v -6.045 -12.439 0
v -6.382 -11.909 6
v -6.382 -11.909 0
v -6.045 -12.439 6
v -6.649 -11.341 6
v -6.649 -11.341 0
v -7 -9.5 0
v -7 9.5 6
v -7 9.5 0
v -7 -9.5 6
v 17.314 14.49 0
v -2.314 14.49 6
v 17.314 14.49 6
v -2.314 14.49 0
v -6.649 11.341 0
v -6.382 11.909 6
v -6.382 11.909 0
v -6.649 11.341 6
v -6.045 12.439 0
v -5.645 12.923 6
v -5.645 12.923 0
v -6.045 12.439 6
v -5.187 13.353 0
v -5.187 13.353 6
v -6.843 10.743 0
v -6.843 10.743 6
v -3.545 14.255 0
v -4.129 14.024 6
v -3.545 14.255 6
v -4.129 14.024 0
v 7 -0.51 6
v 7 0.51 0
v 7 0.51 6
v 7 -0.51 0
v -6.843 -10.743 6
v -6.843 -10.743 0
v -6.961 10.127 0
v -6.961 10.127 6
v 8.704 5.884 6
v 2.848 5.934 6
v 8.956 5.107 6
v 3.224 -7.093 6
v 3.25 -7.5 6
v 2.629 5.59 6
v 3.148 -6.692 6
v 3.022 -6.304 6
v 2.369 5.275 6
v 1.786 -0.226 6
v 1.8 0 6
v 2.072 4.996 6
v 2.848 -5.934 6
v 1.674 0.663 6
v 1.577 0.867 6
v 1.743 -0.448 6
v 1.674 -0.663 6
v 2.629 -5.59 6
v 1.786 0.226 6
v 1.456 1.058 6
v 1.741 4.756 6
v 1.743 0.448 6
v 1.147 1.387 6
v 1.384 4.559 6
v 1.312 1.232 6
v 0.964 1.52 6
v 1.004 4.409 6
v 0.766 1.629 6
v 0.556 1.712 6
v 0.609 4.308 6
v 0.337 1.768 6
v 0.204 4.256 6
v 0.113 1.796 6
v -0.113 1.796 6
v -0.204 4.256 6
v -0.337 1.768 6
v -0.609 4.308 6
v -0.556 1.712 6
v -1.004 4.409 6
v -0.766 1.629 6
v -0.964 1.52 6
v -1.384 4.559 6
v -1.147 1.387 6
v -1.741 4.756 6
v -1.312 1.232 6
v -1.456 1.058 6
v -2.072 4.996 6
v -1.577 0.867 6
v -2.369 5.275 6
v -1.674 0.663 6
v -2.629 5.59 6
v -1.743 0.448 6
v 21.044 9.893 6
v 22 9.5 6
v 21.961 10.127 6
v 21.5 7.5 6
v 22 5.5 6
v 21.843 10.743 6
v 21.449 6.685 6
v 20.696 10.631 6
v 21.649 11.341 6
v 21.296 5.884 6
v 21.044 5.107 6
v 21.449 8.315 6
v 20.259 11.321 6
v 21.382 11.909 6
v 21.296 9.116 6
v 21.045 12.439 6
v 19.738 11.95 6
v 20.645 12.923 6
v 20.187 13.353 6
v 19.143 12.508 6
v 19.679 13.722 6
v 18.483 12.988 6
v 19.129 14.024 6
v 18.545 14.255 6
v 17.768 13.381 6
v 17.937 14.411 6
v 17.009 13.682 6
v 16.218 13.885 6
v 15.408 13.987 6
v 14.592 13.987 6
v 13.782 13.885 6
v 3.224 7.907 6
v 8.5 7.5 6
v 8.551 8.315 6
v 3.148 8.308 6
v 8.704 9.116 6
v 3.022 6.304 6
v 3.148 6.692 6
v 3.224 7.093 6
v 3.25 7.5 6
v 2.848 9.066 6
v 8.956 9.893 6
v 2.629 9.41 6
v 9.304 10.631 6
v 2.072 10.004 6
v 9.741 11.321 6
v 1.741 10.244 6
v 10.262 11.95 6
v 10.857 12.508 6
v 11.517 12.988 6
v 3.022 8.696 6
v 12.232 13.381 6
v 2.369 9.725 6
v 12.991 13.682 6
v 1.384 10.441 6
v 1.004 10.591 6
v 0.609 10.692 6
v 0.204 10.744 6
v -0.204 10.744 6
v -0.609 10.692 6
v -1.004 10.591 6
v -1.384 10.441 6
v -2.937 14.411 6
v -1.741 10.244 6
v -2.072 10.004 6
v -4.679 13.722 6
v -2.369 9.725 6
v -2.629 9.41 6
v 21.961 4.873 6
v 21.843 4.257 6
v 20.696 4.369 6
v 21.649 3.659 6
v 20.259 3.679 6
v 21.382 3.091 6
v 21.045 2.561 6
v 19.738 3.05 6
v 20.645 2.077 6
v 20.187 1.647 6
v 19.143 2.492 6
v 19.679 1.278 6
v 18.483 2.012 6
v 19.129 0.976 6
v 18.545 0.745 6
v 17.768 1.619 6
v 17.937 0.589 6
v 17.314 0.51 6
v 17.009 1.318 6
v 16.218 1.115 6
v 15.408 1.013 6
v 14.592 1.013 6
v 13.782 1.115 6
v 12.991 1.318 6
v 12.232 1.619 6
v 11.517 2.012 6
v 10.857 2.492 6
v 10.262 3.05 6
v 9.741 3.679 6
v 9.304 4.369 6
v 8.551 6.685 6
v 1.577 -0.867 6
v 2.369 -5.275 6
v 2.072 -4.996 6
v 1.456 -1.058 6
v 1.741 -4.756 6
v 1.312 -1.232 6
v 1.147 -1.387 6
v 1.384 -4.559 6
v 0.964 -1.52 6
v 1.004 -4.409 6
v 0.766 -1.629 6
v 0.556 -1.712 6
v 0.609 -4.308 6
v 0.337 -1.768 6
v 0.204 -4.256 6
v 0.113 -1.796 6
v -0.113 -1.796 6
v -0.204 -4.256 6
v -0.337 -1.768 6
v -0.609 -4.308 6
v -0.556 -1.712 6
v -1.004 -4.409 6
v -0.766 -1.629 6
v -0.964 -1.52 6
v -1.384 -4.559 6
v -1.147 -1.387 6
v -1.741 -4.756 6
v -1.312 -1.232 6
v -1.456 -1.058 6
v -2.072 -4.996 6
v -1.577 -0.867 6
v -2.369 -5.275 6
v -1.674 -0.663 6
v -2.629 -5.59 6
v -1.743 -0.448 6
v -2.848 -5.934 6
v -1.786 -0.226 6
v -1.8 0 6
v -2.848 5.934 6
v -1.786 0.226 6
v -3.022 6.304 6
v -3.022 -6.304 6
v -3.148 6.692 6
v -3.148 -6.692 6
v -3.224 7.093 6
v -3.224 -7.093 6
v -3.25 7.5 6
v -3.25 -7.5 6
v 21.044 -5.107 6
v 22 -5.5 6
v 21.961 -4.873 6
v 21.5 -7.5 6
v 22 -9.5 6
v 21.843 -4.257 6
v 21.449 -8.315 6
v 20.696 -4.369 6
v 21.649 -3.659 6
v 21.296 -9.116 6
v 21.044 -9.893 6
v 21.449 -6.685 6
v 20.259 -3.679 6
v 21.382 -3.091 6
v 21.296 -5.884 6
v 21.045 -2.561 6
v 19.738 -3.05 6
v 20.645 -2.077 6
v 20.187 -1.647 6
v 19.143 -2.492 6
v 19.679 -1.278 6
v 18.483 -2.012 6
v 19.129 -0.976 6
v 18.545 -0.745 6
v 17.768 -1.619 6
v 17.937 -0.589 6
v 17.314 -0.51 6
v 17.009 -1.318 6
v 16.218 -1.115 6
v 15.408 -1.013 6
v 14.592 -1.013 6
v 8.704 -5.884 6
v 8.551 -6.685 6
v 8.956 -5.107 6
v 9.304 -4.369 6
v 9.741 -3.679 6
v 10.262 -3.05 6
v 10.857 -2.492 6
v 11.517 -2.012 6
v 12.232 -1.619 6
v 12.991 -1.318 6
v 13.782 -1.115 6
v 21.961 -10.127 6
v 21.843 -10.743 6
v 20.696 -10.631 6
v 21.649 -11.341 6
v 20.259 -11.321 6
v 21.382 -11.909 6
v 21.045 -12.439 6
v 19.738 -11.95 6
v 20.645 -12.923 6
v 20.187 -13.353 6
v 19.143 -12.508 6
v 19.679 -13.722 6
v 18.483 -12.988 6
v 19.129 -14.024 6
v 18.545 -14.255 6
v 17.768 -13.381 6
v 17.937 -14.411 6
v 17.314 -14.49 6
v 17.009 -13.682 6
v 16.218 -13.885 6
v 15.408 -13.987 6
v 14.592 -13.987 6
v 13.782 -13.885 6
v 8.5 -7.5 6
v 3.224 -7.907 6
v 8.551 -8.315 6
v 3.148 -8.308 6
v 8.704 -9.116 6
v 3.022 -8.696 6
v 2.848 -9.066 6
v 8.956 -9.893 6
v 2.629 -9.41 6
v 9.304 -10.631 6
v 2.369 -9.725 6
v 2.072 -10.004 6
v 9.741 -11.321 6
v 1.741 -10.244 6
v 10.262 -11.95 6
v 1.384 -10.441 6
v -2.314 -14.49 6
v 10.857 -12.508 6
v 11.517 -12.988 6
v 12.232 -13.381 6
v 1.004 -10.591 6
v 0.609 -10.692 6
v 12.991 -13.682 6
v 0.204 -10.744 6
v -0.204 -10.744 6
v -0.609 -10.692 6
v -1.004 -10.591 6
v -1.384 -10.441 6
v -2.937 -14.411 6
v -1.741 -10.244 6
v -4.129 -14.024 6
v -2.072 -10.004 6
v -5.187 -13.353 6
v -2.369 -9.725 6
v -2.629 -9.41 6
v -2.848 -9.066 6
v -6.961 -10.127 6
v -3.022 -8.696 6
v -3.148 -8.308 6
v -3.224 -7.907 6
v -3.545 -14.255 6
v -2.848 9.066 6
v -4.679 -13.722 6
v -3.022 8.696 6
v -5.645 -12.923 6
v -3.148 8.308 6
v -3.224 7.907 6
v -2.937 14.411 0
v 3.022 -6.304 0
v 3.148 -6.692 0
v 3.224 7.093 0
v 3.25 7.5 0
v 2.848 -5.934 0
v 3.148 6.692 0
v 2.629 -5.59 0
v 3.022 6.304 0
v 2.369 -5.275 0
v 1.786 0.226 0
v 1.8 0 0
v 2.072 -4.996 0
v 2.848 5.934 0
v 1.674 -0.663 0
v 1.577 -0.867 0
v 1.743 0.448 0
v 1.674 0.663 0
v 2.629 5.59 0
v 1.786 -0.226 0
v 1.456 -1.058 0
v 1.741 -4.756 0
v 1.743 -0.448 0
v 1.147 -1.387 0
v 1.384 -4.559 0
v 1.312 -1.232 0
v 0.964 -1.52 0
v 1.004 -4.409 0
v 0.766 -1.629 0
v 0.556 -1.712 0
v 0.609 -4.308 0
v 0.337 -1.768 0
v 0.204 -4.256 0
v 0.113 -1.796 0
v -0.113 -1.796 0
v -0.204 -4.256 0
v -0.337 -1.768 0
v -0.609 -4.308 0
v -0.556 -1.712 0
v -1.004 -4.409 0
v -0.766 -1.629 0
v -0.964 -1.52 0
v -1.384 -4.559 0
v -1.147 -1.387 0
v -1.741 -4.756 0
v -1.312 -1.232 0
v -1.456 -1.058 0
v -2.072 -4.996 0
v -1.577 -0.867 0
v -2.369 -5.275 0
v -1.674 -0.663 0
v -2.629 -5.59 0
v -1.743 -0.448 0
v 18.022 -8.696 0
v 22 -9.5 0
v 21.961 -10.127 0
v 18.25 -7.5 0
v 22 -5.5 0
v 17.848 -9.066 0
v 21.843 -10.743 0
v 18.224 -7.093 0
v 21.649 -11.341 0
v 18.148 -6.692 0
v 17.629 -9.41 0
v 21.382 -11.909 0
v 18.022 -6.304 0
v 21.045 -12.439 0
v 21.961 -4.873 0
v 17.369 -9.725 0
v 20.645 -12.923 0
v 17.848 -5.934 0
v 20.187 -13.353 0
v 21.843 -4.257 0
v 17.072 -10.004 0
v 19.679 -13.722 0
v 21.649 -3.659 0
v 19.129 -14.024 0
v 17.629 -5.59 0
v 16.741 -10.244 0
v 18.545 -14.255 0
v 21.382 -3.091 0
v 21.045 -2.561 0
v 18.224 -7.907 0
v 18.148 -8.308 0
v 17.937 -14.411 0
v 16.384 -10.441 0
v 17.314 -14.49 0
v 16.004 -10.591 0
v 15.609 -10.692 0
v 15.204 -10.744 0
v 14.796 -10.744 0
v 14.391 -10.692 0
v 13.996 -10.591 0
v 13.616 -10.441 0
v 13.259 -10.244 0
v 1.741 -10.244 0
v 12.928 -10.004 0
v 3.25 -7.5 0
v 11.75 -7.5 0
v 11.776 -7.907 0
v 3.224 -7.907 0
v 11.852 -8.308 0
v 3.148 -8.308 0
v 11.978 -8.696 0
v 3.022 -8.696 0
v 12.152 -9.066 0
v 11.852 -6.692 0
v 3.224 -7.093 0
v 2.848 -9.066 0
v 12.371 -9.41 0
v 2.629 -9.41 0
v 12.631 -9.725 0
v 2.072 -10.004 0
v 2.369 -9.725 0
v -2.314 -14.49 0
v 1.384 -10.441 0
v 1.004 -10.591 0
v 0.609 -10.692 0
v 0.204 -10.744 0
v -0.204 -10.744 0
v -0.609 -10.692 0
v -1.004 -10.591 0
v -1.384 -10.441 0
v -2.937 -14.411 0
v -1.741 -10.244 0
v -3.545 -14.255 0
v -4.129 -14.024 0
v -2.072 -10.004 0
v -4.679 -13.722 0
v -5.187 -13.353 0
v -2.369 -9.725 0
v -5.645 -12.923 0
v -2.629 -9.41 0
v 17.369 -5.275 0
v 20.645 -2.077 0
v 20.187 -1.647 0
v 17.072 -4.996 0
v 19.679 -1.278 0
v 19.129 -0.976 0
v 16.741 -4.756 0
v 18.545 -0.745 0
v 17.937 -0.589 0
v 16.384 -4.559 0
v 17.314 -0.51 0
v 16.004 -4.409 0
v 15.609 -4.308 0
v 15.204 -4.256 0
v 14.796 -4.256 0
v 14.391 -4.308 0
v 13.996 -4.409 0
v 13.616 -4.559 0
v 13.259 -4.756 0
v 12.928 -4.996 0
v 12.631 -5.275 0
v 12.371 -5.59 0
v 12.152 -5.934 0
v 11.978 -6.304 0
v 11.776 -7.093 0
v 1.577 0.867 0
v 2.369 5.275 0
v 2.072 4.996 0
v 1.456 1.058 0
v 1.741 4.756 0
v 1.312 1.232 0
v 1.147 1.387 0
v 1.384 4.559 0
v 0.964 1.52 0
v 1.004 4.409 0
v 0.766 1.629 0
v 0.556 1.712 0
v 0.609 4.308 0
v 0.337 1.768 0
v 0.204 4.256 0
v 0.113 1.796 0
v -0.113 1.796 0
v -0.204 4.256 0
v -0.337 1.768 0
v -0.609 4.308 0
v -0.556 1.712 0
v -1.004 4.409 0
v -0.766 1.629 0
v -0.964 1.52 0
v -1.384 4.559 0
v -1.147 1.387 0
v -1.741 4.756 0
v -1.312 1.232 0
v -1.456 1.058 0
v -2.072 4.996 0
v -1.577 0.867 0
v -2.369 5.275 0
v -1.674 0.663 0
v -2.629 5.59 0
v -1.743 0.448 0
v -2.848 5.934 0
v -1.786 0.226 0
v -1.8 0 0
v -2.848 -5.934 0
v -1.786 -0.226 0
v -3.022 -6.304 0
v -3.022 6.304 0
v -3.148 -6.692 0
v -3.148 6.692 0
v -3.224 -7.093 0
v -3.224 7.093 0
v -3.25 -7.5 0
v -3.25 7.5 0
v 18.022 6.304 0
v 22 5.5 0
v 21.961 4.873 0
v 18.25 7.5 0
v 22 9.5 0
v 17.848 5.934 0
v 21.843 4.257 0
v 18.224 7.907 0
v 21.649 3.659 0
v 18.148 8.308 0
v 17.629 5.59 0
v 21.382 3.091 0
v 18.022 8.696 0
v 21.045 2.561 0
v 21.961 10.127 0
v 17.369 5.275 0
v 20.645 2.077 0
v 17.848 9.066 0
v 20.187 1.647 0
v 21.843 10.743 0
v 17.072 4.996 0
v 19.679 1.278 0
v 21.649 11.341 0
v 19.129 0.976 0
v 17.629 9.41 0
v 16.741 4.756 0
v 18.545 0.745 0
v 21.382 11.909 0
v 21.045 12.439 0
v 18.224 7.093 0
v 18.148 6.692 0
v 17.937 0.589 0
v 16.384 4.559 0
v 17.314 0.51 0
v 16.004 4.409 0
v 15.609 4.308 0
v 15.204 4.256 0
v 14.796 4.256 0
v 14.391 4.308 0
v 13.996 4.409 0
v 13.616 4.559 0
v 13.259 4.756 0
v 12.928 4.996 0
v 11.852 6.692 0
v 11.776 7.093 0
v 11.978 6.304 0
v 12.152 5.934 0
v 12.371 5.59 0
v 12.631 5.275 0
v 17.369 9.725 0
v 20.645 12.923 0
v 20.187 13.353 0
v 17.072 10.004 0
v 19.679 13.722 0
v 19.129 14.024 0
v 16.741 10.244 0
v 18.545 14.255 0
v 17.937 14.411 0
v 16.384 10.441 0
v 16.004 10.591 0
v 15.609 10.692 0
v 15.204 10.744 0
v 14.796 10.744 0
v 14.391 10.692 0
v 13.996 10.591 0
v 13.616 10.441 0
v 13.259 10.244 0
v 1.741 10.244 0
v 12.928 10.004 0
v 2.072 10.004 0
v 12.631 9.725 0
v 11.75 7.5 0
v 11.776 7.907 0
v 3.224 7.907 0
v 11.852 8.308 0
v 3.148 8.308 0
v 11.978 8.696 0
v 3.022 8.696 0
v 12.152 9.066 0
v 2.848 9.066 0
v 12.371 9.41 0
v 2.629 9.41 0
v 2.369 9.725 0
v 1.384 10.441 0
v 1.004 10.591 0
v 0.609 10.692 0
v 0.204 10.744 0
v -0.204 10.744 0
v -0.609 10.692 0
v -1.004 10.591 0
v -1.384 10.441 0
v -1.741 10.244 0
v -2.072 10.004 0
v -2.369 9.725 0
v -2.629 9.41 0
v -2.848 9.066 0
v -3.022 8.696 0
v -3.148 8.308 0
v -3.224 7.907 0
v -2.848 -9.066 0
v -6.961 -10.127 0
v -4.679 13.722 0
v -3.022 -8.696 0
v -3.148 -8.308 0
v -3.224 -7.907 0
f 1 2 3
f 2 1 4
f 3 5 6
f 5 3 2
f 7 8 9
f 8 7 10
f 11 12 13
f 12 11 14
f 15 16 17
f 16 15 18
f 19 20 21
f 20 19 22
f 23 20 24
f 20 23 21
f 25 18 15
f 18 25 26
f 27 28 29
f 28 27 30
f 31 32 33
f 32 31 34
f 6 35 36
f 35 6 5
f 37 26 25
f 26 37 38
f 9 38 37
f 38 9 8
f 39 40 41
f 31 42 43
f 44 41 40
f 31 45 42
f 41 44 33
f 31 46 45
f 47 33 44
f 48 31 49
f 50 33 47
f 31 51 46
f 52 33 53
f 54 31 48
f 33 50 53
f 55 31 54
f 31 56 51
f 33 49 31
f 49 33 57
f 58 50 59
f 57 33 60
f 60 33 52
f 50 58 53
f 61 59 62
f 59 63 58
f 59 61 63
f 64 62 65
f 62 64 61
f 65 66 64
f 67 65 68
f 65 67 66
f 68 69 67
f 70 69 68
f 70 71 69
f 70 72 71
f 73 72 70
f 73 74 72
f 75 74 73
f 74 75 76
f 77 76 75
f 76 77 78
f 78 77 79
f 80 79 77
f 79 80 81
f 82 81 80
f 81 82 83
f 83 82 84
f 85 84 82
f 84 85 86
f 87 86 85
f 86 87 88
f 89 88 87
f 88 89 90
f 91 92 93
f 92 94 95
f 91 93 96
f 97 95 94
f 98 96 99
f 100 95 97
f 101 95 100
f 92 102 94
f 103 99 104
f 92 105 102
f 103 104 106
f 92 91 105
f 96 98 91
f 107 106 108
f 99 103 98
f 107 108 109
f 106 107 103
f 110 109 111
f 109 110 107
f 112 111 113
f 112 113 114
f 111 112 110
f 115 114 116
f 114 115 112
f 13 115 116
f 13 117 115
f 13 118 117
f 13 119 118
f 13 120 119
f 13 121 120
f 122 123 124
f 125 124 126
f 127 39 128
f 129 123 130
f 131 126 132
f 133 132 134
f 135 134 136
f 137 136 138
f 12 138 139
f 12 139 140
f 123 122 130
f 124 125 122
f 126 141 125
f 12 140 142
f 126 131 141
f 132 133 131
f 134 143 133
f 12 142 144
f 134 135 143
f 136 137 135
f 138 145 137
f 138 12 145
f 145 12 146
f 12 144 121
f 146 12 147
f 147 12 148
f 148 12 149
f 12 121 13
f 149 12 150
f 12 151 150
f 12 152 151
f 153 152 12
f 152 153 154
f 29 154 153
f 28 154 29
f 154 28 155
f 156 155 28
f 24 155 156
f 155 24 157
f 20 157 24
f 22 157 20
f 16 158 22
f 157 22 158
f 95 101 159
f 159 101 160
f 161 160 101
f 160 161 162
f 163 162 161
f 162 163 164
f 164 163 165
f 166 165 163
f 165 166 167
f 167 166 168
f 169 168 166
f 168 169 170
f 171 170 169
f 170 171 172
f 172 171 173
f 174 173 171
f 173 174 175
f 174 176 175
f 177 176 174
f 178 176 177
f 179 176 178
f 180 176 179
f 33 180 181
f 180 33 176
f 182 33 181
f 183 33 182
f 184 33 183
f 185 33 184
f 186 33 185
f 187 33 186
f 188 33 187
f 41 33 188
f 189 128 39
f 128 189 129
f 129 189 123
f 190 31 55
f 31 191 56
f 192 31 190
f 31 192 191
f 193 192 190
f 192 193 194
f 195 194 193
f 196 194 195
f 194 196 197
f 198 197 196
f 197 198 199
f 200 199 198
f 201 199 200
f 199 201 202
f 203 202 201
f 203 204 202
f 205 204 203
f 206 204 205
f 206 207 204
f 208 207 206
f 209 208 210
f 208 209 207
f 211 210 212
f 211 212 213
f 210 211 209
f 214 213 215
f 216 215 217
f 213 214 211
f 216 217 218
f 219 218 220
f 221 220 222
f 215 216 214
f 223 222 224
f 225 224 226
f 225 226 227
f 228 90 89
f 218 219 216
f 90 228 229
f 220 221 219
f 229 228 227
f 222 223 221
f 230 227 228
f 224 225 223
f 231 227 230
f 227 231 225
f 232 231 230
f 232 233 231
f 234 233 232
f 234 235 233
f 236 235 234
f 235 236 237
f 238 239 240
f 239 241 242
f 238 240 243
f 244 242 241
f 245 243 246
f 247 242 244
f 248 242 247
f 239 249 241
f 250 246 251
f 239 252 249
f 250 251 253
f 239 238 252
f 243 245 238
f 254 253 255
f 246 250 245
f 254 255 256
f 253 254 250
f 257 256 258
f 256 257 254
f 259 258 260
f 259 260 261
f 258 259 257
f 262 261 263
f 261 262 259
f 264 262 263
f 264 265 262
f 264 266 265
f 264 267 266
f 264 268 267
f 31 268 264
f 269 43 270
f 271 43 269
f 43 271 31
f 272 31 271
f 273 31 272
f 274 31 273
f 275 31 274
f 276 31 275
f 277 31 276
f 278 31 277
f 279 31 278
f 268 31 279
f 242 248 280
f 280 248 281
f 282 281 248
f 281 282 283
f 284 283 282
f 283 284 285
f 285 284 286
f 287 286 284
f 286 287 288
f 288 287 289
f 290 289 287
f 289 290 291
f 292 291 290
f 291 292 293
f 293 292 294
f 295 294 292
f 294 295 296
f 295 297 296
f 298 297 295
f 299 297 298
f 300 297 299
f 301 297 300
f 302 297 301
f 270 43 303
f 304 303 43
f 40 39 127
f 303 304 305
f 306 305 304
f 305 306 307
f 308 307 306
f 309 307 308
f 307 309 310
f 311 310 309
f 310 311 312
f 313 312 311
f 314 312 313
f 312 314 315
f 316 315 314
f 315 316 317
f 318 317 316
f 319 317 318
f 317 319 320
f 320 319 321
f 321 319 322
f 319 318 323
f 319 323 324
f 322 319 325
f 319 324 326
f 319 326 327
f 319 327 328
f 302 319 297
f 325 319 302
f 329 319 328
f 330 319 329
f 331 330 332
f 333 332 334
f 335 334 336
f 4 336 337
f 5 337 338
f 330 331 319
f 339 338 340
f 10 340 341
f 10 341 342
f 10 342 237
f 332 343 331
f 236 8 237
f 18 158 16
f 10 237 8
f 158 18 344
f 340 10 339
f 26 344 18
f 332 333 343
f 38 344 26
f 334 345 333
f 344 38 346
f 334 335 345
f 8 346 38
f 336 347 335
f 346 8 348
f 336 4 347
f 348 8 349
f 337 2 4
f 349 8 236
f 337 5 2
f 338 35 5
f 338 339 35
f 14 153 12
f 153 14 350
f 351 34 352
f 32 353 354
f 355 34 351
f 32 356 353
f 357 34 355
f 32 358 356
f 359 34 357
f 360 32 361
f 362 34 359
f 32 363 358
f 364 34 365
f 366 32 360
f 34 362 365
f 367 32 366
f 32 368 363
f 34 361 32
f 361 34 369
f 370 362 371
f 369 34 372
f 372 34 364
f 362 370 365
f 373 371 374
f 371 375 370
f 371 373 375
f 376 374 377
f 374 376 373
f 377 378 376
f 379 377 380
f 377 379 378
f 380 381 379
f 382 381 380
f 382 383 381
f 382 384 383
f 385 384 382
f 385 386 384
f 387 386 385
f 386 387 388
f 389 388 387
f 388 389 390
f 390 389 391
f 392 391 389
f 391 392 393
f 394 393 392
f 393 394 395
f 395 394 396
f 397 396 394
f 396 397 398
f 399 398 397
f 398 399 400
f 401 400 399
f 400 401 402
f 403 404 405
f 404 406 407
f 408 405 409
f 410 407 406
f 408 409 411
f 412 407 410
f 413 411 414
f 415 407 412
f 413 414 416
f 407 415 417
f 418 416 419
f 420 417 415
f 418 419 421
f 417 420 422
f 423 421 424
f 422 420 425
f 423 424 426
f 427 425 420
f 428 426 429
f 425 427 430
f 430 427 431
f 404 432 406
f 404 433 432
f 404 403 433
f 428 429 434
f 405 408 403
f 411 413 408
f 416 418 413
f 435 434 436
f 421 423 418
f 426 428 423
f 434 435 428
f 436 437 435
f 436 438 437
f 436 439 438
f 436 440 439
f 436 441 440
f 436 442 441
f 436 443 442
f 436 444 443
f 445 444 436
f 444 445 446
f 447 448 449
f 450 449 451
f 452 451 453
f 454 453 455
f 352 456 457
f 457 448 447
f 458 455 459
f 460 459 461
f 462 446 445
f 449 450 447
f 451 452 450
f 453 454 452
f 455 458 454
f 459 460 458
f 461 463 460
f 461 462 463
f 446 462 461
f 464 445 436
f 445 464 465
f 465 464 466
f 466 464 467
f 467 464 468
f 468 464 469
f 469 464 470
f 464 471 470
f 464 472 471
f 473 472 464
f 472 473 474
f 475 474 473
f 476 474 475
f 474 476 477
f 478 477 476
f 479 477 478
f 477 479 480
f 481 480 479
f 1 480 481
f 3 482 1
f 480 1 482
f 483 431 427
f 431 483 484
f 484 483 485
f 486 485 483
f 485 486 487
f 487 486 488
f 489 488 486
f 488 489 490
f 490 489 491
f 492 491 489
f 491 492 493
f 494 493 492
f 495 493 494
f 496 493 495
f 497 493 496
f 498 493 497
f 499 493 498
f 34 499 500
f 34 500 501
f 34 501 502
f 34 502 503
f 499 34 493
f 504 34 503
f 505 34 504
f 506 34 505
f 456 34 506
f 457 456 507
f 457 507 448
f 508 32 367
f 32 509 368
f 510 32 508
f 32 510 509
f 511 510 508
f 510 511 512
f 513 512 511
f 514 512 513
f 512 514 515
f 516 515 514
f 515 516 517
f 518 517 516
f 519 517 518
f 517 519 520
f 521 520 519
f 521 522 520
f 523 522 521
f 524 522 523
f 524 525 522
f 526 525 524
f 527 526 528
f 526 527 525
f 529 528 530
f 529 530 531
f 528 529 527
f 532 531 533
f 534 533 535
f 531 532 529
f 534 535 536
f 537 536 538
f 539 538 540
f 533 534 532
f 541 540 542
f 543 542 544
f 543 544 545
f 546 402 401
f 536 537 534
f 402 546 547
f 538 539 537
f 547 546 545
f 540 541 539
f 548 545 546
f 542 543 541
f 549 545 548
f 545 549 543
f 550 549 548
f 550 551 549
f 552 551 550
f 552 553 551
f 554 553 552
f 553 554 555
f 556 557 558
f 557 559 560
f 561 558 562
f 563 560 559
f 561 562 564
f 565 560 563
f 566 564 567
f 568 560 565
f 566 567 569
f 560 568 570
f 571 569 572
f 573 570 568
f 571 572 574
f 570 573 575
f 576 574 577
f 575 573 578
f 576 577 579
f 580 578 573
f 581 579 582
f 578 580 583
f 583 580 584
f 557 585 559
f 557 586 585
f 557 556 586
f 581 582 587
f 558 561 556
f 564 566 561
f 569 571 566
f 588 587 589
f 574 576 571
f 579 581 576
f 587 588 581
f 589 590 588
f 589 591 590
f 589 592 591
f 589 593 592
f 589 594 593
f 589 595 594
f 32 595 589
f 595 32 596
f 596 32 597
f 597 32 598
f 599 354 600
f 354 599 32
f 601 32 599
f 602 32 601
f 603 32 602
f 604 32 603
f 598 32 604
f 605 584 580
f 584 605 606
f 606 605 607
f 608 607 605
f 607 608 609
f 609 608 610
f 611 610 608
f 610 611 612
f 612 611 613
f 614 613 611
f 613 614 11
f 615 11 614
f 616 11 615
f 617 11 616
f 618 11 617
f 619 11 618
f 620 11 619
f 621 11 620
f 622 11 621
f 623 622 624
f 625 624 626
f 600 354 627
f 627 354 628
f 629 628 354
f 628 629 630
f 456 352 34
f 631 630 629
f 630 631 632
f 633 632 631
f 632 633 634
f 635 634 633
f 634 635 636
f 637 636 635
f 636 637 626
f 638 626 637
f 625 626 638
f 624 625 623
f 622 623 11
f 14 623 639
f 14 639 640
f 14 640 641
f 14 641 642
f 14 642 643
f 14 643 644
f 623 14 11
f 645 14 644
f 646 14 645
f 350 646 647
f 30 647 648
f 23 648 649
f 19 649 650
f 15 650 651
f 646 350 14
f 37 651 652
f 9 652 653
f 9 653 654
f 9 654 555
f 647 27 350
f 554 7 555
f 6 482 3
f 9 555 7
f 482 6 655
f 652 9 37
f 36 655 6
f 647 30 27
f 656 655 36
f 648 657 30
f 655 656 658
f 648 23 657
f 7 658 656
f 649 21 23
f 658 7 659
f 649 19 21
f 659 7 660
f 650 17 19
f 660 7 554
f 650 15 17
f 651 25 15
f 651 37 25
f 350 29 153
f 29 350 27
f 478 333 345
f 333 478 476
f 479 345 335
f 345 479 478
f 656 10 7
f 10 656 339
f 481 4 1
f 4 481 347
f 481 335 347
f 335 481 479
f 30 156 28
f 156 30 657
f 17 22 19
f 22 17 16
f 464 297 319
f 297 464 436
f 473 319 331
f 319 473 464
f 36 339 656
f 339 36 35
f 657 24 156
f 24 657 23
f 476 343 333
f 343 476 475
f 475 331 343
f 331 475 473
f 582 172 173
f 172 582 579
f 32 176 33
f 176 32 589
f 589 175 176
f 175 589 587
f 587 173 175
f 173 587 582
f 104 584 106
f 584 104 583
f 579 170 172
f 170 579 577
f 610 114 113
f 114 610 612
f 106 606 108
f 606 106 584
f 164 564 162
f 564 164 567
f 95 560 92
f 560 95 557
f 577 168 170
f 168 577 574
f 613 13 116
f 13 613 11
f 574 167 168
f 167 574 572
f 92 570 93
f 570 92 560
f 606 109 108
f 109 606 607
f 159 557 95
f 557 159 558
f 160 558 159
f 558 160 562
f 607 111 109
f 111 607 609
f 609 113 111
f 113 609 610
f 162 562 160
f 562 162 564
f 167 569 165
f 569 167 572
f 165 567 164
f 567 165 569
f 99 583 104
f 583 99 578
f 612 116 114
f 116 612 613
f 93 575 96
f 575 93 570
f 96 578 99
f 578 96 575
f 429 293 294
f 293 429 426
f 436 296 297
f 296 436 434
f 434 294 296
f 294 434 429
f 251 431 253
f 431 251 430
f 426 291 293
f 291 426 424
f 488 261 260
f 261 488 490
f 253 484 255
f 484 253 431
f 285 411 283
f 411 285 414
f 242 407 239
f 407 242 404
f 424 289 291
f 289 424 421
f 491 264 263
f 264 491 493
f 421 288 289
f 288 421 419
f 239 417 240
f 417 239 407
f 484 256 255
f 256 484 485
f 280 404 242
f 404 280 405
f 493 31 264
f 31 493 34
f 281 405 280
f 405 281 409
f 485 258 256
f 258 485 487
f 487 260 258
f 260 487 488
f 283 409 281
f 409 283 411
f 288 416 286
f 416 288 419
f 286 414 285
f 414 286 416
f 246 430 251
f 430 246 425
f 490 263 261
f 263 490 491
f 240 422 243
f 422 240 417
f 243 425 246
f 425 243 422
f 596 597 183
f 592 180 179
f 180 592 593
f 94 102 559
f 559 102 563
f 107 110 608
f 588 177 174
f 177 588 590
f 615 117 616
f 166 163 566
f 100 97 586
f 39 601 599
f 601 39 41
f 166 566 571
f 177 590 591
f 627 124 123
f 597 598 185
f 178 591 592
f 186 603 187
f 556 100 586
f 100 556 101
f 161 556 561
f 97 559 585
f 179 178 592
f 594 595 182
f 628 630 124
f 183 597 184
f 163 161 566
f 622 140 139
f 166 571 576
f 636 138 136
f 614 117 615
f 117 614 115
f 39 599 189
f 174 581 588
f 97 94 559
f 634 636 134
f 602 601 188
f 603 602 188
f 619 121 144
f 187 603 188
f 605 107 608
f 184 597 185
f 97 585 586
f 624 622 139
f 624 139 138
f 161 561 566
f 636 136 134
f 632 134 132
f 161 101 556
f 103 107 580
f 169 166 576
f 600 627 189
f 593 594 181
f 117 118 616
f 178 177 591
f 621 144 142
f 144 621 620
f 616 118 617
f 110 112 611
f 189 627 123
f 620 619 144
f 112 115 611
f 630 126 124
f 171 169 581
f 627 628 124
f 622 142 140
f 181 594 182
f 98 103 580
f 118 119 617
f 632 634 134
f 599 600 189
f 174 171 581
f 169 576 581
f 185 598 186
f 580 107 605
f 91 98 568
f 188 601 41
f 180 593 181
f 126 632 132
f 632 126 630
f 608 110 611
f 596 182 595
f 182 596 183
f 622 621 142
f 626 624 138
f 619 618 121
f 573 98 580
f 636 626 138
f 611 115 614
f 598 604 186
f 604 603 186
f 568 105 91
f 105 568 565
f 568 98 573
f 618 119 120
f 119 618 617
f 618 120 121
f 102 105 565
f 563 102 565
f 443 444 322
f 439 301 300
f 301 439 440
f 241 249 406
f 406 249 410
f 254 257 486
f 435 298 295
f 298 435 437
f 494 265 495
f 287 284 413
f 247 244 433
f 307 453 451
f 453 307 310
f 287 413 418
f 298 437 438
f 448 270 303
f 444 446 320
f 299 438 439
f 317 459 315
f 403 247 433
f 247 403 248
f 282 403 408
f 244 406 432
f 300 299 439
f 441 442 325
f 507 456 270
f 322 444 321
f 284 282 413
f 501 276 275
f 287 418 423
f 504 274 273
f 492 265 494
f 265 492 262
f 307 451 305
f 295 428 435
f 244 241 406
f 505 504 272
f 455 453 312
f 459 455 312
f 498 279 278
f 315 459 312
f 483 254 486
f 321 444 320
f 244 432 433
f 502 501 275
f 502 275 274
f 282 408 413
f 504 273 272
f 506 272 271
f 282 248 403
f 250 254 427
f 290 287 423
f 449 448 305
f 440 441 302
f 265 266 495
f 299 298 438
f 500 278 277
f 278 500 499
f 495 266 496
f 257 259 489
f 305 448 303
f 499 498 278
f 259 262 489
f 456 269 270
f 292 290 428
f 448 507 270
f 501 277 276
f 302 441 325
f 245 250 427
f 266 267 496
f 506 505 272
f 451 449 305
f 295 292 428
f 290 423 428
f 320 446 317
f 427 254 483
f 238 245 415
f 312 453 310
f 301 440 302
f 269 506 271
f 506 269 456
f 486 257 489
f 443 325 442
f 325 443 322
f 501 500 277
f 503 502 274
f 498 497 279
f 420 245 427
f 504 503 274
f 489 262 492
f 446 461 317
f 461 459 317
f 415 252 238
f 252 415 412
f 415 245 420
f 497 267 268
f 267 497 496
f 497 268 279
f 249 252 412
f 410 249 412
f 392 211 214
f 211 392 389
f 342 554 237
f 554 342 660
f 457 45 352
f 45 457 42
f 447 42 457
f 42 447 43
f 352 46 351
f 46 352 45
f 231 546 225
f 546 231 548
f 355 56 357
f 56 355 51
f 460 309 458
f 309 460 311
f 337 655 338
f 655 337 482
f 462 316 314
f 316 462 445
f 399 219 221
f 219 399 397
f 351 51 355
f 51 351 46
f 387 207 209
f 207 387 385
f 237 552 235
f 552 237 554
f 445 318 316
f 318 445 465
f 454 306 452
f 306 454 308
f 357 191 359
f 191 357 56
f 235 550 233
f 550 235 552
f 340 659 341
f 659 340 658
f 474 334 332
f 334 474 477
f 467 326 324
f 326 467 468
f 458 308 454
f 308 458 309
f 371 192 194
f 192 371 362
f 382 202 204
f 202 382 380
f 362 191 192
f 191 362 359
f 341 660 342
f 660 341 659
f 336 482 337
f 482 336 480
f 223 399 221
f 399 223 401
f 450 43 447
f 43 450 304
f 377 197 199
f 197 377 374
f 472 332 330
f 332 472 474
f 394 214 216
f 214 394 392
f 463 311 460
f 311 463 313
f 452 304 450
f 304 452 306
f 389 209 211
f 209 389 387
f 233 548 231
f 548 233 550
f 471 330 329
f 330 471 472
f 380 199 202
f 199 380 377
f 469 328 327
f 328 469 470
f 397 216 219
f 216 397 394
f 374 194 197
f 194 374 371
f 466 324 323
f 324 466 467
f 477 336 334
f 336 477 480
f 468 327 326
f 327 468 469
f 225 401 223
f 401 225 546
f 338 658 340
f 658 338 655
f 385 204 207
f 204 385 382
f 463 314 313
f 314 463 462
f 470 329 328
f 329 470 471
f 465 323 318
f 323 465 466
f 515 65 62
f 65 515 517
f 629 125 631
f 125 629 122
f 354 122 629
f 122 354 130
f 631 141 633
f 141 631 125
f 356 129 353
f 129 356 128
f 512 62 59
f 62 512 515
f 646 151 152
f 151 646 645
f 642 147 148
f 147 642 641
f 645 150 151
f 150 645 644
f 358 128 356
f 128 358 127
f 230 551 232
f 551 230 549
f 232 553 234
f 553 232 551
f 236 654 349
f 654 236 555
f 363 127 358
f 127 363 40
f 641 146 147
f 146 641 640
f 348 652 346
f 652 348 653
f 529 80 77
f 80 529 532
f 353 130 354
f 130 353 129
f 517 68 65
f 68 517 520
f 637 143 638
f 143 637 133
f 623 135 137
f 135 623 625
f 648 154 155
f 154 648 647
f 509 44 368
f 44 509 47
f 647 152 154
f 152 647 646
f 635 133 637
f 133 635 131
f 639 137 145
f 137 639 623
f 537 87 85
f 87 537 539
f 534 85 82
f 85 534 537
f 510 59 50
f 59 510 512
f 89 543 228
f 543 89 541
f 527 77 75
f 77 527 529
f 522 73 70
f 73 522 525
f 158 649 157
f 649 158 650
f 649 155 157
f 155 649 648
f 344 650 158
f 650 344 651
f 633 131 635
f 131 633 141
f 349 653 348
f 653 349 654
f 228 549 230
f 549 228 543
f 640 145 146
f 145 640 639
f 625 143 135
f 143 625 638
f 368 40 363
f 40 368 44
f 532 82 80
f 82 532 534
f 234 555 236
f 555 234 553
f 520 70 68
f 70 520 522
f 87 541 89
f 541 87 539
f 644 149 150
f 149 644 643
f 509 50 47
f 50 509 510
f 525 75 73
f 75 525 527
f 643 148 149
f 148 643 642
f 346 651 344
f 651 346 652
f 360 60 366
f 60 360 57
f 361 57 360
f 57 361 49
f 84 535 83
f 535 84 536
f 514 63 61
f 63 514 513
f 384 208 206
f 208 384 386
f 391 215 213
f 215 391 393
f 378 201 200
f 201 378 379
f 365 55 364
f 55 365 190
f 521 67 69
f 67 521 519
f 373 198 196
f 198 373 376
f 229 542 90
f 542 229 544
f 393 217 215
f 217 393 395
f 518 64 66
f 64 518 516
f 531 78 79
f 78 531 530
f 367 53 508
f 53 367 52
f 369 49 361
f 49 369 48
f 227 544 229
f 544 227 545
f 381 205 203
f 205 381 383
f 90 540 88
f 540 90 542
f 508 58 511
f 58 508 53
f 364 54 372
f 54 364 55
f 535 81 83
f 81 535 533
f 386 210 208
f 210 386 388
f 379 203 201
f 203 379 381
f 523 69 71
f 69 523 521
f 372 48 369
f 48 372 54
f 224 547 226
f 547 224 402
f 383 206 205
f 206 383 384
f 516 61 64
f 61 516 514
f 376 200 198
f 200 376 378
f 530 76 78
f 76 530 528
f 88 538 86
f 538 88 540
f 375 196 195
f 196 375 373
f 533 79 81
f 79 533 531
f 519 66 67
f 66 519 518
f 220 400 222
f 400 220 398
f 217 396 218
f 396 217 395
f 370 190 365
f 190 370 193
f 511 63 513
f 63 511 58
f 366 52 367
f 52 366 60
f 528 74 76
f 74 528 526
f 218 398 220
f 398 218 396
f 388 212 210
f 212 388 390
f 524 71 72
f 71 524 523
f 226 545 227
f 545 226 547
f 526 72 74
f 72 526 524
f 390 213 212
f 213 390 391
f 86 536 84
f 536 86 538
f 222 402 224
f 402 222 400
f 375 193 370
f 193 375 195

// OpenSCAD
$fn = 50;


difference() {
	union() {
		hull() {
			translate(v = [-2.0000000000, 9.5000000000, 0]) {
				cylinder(h = 6, r = 5);
			}
			translate(v = [2.0000000000, 9.5000000000, 0]) {
				cylinder(h = 6, r = 5);
			}
			translate(v = [-2.0000000000, -9.5000000000, 0]) {
				cylinder(h = 6, r = 5);
			}
			translate(v = [2.0000000000, -9.5000000000, 0]) {
				cylinder(h = 6, r = 5);
			}
		}
		translate(v = [7.5000000000, 7.5000000000, 0]) {
			hull() {
				translate(v = [-9.5000000000, 2.0000000000, 0]) {
					cylinder(h = 6, r = 5);
				}
				translate(v = [9.5000000000, 2.0000000000, 0]) {
					cylinder(h = 6, r = 5);
				}
				translate(v = [-9.5000000000, -2.0000000000, 0]) {
					cylinder(h = 6, r = 5);
				}
				translate(v = [9.5000000000, -2.0000000000, 0]) {
					cylinder(h = 6, r = 5);
				}
			}
		}
		translate(v = [7.5000000000, -7.5000000000, 0]) {
			hull() {
				translate(v = [-9.5000000000, 2.0000000000, 0]) {
					cylinder(h = 6, r = 5);
				}
				translate(v = [9.5000000000, 2.0000000000, 0]) {
					cylinder(h = 6, r = 5);
				}
				translate(v = [-9.5000000000, -2.0000000000, 0]) {
					cylinder(h = 6, r = 5);
				}
				translate(v = [9.5000000000, -2.0000000000, 0]) {
					cylinder(h = 6, r = 5);
				}
			}
		}
	}
	union() {
		translate(v = [15.0000000000, 7.5000000000, 6]) {
			rotate(a = [0, 0, 0]) {
				difference() {
					union() {
						#translate(v = [0, 0, -6.0000000000]) {
							cylinder(h = 6, r = 2.2500000000);
						}
						#translate(v = [0, 0, -6]) {
							cylinder(h = 6, r1 = 3.2500000000, r2 = 6.5000000000);
						}
						#translate(v = [0, 0, -6.0000000000]) {
							cylinder(h = 6, r = 3.2500000000);
						}
						#translate(v = [0, 0, -6.0000000000]) {
							cylinder(h = 6, r = 2.2500000000);
						}
					}
					union();
				}
			}
		}
		translate(v = [15.0000000000, -7.5000000000, 6]) {
			rotate(a = [0, 0, 0]) {
				difference() {
					union() {
						#translate(v = [0, 0, -6.0000000000]) {
							cylinder(h = 6, r = 2.2500000000);
						}
						#translate(v = [0, 0, -6]) {
							cylinder(h = 6, r1 = 3.2500000000, r2 = 6.5000000000);
						}
						#translate(v = [0, 0, -6.0000000000]) {
							cylinder(h = 6, r = 3.2500000000);
						}
						#translate(v = [0, 0, -6.0000000000]) {
							cylinder(h = 6, r = 2.2500000000);
						}
					}
					union();
				}
			}
		}
		translate(v = [0.0000000000, -7.5000000000, 0]) {
			translate(v = [0, 0, -100]) {
				cylinder(h = 200, r = 3.2500000000);
			}
		}
		translate(v = [0.0000000000, 7.5000000000, 0]) {
			translate(v = [0, 0, -100]) {
				cylinder(h = 200, r = 3.2500000000);
			}
		}
		translate(v = [0.0000000000, -7.5000000000, 0]) {
			translate(v = [0, 0, -100]) {
				cylinder(h = 200, r = 1.8000000000);
			}
		}
		translate(v = [0, 0, -100]) {
			cylinder(h = 200, r = 1.8000000000);
		}
		translate(v = [0.0000000000, 7.5000000000, 0]) {
			translate(v = [0, 0, -100]) {
				cylinder(h = 200, r = 1.8000000000);
			}
		}
	}
}
